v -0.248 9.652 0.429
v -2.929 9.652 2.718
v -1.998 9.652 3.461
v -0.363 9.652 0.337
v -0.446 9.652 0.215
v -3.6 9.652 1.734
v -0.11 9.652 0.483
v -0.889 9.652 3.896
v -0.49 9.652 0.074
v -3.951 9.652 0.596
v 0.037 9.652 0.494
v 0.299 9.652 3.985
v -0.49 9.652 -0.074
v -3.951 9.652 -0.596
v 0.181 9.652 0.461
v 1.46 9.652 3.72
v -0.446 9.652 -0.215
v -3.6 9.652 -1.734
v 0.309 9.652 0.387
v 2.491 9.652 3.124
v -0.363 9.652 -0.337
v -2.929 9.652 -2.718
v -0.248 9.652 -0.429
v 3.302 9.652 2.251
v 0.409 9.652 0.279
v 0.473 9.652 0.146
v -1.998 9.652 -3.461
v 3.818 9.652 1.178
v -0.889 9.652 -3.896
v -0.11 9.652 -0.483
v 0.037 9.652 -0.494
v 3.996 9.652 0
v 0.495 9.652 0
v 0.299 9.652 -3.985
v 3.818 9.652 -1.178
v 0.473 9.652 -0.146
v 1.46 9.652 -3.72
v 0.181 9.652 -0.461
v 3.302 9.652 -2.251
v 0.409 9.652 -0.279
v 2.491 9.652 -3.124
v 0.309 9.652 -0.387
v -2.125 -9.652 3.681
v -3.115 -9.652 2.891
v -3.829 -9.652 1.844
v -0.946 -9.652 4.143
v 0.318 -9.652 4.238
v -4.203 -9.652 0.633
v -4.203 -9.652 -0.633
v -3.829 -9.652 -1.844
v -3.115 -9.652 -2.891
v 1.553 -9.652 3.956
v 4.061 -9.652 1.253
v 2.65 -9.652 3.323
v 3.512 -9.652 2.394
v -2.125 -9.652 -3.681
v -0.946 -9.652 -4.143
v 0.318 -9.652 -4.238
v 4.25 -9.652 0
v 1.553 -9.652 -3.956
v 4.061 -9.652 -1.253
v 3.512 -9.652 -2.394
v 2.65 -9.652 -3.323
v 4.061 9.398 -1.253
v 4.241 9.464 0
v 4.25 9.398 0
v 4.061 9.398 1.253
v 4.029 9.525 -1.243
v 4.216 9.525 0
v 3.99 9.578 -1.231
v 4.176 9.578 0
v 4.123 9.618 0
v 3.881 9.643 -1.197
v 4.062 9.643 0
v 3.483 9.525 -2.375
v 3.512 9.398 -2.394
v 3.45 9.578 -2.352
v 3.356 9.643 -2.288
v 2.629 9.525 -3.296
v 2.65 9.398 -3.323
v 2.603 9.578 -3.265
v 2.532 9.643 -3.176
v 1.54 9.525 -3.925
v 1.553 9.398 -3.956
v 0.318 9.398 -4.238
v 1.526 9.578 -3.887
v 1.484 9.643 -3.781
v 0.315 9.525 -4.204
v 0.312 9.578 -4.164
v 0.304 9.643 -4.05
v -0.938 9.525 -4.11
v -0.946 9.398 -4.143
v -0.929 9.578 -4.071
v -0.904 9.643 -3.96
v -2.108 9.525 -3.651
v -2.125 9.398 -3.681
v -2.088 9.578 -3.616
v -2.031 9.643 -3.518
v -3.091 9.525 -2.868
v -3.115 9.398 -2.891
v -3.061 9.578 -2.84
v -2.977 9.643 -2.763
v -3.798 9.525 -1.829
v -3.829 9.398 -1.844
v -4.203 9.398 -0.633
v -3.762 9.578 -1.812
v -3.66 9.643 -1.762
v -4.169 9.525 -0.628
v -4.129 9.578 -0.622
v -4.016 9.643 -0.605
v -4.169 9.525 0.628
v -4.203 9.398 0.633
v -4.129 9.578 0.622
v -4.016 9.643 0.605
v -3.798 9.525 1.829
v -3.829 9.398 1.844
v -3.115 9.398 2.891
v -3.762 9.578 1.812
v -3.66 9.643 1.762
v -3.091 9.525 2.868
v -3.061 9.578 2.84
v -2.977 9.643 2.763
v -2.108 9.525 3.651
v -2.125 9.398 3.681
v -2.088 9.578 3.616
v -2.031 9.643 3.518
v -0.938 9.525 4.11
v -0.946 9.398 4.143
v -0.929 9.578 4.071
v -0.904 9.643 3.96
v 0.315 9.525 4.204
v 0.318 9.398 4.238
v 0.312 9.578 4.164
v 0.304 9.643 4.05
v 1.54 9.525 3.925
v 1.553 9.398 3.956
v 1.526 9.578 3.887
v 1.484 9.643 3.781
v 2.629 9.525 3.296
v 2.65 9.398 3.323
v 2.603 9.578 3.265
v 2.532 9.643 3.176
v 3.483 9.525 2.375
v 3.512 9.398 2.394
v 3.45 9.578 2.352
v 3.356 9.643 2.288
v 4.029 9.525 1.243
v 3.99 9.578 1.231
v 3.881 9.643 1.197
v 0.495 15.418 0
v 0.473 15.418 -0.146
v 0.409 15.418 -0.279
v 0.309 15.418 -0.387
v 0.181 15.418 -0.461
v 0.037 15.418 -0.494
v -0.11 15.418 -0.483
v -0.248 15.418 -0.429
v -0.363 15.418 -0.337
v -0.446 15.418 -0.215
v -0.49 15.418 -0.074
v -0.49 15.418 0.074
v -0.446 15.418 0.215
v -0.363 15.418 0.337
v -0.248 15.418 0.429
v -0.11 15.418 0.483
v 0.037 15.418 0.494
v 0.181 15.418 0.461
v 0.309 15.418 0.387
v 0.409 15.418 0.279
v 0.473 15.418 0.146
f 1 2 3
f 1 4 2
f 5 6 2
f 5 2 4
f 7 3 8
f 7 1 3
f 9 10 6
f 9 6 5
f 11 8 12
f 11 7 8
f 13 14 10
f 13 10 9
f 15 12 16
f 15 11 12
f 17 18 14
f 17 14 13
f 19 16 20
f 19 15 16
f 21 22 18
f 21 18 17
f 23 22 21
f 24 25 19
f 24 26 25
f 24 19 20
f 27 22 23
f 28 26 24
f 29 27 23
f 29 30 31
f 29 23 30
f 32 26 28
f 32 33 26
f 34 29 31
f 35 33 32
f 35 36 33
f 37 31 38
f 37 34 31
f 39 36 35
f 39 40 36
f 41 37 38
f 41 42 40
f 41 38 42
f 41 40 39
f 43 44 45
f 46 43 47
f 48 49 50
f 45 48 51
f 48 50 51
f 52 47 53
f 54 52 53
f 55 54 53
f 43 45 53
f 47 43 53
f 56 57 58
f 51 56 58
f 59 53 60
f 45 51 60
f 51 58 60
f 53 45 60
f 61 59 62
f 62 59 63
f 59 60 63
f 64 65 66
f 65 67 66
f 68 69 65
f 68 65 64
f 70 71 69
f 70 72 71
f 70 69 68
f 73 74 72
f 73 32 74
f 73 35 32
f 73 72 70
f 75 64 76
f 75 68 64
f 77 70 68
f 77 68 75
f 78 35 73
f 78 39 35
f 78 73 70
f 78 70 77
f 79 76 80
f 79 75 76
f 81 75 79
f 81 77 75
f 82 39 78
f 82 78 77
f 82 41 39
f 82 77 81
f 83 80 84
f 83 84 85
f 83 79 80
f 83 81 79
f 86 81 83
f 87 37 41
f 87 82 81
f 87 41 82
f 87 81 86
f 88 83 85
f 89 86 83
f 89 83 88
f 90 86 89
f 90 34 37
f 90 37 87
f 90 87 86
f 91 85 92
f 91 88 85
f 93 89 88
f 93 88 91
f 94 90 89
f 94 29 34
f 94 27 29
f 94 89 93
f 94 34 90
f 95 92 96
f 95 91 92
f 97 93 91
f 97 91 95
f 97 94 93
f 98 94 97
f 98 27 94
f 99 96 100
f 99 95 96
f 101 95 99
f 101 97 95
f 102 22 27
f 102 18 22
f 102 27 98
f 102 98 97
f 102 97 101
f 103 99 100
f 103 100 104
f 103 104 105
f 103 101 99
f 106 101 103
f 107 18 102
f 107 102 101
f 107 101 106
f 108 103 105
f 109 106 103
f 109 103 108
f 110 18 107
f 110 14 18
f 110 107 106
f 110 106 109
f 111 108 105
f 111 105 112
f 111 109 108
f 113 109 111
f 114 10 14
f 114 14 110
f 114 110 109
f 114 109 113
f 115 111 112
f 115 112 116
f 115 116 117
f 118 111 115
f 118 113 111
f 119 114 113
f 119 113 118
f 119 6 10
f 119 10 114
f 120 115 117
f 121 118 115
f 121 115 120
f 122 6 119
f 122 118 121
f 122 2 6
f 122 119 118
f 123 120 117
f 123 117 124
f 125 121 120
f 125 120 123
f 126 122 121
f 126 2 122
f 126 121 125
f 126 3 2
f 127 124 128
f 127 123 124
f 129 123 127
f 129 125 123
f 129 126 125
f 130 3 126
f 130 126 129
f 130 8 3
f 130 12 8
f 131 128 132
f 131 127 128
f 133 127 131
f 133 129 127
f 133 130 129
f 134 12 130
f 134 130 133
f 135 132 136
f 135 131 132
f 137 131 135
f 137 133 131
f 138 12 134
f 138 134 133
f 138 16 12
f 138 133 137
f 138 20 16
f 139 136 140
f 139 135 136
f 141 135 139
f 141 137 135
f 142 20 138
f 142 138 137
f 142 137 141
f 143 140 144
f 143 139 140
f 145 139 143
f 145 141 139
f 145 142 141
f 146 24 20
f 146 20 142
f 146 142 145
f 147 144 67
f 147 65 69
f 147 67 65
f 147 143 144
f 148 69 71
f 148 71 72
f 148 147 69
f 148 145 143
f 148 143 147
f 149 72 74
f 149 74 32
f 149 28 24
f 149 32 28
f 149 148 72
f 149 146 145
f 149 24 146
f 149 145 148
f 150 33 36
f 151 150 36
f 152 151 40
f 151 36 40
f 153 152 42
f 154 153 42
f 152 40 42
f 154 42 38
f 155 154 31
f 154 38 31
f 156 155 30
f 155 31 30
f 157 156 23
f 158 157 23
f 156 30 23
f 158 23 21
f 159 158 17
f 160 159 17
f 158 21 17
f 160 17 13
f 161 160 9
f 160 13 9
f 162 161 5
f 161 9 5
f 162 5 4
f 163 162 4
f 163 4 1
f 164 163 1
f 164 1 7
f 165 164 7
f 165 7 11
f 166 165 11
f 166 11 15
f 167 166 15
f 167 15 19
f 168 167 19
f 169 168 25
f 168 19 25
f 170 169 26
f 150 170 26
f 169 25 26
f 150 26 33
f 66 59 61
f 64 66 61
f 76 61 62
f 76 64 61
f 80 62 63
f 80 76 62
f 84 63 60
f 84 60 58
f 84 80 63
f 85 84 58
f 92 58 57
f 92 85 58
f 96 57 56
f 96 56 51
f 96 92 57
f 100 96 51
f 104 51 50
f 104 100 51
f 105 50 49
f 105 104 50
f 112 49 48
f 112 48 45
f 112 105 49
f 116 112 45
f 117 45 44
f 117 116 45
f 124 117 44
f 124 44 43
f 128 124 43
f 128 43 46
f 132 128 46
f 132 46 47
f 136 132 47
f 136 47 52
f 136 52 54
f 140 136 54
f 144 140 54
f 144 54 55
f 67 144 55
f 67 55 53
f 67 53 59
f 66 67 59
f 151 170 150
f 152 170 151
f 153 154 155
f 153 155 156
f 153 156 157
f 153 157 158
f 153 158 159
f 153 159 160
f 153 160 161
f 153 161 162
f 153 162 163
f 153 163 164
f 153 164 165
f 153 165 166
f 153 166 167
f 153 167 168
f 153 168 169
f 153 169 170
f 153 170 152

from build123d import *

# Parameters (mm, degrees)
SKETCH1_R           = 4.25
BOSS_EXTRUDE1_DEPTH = 9.652
SKETCH2_R           = 0.4953
BOSS_EXTRUDE2_DEPTH = 5.7658
FILLET1_R           = 0.254


with BuildPart() as part:
    # Sketch1 → Boss-Extrude1 (new body, symmetric)
    with BuildSketch(Plane(origin=(0, 0, 0), x_dir=(1, 0, 0), z_dir=(0, 1, 0))):
        Circle(SKETCH1_R)
    extrude(amount=BOSS_EXTRUDE1_DEPTH, both=True)

    # Sketch2 → Boss-Extrude2 (add)
    with BuildSketch(Plane(origin=(0, 9.652, 0), x_dir=(1, 0, 0), z_dir=(0, 1, 0))):
        Circle(SKETCH2_R)
    extrude(amount=BOSS_EXTRUDE2_DEPTH)

    # Fillet1
    fillet1_edges = [part.edges().sort_by_distance(p)[0] for p in [
        (-4.25, 9.652, 0),
    ]]
    fillet(fillet1_edges, radius=FILLET1_R)


solid = part.part
